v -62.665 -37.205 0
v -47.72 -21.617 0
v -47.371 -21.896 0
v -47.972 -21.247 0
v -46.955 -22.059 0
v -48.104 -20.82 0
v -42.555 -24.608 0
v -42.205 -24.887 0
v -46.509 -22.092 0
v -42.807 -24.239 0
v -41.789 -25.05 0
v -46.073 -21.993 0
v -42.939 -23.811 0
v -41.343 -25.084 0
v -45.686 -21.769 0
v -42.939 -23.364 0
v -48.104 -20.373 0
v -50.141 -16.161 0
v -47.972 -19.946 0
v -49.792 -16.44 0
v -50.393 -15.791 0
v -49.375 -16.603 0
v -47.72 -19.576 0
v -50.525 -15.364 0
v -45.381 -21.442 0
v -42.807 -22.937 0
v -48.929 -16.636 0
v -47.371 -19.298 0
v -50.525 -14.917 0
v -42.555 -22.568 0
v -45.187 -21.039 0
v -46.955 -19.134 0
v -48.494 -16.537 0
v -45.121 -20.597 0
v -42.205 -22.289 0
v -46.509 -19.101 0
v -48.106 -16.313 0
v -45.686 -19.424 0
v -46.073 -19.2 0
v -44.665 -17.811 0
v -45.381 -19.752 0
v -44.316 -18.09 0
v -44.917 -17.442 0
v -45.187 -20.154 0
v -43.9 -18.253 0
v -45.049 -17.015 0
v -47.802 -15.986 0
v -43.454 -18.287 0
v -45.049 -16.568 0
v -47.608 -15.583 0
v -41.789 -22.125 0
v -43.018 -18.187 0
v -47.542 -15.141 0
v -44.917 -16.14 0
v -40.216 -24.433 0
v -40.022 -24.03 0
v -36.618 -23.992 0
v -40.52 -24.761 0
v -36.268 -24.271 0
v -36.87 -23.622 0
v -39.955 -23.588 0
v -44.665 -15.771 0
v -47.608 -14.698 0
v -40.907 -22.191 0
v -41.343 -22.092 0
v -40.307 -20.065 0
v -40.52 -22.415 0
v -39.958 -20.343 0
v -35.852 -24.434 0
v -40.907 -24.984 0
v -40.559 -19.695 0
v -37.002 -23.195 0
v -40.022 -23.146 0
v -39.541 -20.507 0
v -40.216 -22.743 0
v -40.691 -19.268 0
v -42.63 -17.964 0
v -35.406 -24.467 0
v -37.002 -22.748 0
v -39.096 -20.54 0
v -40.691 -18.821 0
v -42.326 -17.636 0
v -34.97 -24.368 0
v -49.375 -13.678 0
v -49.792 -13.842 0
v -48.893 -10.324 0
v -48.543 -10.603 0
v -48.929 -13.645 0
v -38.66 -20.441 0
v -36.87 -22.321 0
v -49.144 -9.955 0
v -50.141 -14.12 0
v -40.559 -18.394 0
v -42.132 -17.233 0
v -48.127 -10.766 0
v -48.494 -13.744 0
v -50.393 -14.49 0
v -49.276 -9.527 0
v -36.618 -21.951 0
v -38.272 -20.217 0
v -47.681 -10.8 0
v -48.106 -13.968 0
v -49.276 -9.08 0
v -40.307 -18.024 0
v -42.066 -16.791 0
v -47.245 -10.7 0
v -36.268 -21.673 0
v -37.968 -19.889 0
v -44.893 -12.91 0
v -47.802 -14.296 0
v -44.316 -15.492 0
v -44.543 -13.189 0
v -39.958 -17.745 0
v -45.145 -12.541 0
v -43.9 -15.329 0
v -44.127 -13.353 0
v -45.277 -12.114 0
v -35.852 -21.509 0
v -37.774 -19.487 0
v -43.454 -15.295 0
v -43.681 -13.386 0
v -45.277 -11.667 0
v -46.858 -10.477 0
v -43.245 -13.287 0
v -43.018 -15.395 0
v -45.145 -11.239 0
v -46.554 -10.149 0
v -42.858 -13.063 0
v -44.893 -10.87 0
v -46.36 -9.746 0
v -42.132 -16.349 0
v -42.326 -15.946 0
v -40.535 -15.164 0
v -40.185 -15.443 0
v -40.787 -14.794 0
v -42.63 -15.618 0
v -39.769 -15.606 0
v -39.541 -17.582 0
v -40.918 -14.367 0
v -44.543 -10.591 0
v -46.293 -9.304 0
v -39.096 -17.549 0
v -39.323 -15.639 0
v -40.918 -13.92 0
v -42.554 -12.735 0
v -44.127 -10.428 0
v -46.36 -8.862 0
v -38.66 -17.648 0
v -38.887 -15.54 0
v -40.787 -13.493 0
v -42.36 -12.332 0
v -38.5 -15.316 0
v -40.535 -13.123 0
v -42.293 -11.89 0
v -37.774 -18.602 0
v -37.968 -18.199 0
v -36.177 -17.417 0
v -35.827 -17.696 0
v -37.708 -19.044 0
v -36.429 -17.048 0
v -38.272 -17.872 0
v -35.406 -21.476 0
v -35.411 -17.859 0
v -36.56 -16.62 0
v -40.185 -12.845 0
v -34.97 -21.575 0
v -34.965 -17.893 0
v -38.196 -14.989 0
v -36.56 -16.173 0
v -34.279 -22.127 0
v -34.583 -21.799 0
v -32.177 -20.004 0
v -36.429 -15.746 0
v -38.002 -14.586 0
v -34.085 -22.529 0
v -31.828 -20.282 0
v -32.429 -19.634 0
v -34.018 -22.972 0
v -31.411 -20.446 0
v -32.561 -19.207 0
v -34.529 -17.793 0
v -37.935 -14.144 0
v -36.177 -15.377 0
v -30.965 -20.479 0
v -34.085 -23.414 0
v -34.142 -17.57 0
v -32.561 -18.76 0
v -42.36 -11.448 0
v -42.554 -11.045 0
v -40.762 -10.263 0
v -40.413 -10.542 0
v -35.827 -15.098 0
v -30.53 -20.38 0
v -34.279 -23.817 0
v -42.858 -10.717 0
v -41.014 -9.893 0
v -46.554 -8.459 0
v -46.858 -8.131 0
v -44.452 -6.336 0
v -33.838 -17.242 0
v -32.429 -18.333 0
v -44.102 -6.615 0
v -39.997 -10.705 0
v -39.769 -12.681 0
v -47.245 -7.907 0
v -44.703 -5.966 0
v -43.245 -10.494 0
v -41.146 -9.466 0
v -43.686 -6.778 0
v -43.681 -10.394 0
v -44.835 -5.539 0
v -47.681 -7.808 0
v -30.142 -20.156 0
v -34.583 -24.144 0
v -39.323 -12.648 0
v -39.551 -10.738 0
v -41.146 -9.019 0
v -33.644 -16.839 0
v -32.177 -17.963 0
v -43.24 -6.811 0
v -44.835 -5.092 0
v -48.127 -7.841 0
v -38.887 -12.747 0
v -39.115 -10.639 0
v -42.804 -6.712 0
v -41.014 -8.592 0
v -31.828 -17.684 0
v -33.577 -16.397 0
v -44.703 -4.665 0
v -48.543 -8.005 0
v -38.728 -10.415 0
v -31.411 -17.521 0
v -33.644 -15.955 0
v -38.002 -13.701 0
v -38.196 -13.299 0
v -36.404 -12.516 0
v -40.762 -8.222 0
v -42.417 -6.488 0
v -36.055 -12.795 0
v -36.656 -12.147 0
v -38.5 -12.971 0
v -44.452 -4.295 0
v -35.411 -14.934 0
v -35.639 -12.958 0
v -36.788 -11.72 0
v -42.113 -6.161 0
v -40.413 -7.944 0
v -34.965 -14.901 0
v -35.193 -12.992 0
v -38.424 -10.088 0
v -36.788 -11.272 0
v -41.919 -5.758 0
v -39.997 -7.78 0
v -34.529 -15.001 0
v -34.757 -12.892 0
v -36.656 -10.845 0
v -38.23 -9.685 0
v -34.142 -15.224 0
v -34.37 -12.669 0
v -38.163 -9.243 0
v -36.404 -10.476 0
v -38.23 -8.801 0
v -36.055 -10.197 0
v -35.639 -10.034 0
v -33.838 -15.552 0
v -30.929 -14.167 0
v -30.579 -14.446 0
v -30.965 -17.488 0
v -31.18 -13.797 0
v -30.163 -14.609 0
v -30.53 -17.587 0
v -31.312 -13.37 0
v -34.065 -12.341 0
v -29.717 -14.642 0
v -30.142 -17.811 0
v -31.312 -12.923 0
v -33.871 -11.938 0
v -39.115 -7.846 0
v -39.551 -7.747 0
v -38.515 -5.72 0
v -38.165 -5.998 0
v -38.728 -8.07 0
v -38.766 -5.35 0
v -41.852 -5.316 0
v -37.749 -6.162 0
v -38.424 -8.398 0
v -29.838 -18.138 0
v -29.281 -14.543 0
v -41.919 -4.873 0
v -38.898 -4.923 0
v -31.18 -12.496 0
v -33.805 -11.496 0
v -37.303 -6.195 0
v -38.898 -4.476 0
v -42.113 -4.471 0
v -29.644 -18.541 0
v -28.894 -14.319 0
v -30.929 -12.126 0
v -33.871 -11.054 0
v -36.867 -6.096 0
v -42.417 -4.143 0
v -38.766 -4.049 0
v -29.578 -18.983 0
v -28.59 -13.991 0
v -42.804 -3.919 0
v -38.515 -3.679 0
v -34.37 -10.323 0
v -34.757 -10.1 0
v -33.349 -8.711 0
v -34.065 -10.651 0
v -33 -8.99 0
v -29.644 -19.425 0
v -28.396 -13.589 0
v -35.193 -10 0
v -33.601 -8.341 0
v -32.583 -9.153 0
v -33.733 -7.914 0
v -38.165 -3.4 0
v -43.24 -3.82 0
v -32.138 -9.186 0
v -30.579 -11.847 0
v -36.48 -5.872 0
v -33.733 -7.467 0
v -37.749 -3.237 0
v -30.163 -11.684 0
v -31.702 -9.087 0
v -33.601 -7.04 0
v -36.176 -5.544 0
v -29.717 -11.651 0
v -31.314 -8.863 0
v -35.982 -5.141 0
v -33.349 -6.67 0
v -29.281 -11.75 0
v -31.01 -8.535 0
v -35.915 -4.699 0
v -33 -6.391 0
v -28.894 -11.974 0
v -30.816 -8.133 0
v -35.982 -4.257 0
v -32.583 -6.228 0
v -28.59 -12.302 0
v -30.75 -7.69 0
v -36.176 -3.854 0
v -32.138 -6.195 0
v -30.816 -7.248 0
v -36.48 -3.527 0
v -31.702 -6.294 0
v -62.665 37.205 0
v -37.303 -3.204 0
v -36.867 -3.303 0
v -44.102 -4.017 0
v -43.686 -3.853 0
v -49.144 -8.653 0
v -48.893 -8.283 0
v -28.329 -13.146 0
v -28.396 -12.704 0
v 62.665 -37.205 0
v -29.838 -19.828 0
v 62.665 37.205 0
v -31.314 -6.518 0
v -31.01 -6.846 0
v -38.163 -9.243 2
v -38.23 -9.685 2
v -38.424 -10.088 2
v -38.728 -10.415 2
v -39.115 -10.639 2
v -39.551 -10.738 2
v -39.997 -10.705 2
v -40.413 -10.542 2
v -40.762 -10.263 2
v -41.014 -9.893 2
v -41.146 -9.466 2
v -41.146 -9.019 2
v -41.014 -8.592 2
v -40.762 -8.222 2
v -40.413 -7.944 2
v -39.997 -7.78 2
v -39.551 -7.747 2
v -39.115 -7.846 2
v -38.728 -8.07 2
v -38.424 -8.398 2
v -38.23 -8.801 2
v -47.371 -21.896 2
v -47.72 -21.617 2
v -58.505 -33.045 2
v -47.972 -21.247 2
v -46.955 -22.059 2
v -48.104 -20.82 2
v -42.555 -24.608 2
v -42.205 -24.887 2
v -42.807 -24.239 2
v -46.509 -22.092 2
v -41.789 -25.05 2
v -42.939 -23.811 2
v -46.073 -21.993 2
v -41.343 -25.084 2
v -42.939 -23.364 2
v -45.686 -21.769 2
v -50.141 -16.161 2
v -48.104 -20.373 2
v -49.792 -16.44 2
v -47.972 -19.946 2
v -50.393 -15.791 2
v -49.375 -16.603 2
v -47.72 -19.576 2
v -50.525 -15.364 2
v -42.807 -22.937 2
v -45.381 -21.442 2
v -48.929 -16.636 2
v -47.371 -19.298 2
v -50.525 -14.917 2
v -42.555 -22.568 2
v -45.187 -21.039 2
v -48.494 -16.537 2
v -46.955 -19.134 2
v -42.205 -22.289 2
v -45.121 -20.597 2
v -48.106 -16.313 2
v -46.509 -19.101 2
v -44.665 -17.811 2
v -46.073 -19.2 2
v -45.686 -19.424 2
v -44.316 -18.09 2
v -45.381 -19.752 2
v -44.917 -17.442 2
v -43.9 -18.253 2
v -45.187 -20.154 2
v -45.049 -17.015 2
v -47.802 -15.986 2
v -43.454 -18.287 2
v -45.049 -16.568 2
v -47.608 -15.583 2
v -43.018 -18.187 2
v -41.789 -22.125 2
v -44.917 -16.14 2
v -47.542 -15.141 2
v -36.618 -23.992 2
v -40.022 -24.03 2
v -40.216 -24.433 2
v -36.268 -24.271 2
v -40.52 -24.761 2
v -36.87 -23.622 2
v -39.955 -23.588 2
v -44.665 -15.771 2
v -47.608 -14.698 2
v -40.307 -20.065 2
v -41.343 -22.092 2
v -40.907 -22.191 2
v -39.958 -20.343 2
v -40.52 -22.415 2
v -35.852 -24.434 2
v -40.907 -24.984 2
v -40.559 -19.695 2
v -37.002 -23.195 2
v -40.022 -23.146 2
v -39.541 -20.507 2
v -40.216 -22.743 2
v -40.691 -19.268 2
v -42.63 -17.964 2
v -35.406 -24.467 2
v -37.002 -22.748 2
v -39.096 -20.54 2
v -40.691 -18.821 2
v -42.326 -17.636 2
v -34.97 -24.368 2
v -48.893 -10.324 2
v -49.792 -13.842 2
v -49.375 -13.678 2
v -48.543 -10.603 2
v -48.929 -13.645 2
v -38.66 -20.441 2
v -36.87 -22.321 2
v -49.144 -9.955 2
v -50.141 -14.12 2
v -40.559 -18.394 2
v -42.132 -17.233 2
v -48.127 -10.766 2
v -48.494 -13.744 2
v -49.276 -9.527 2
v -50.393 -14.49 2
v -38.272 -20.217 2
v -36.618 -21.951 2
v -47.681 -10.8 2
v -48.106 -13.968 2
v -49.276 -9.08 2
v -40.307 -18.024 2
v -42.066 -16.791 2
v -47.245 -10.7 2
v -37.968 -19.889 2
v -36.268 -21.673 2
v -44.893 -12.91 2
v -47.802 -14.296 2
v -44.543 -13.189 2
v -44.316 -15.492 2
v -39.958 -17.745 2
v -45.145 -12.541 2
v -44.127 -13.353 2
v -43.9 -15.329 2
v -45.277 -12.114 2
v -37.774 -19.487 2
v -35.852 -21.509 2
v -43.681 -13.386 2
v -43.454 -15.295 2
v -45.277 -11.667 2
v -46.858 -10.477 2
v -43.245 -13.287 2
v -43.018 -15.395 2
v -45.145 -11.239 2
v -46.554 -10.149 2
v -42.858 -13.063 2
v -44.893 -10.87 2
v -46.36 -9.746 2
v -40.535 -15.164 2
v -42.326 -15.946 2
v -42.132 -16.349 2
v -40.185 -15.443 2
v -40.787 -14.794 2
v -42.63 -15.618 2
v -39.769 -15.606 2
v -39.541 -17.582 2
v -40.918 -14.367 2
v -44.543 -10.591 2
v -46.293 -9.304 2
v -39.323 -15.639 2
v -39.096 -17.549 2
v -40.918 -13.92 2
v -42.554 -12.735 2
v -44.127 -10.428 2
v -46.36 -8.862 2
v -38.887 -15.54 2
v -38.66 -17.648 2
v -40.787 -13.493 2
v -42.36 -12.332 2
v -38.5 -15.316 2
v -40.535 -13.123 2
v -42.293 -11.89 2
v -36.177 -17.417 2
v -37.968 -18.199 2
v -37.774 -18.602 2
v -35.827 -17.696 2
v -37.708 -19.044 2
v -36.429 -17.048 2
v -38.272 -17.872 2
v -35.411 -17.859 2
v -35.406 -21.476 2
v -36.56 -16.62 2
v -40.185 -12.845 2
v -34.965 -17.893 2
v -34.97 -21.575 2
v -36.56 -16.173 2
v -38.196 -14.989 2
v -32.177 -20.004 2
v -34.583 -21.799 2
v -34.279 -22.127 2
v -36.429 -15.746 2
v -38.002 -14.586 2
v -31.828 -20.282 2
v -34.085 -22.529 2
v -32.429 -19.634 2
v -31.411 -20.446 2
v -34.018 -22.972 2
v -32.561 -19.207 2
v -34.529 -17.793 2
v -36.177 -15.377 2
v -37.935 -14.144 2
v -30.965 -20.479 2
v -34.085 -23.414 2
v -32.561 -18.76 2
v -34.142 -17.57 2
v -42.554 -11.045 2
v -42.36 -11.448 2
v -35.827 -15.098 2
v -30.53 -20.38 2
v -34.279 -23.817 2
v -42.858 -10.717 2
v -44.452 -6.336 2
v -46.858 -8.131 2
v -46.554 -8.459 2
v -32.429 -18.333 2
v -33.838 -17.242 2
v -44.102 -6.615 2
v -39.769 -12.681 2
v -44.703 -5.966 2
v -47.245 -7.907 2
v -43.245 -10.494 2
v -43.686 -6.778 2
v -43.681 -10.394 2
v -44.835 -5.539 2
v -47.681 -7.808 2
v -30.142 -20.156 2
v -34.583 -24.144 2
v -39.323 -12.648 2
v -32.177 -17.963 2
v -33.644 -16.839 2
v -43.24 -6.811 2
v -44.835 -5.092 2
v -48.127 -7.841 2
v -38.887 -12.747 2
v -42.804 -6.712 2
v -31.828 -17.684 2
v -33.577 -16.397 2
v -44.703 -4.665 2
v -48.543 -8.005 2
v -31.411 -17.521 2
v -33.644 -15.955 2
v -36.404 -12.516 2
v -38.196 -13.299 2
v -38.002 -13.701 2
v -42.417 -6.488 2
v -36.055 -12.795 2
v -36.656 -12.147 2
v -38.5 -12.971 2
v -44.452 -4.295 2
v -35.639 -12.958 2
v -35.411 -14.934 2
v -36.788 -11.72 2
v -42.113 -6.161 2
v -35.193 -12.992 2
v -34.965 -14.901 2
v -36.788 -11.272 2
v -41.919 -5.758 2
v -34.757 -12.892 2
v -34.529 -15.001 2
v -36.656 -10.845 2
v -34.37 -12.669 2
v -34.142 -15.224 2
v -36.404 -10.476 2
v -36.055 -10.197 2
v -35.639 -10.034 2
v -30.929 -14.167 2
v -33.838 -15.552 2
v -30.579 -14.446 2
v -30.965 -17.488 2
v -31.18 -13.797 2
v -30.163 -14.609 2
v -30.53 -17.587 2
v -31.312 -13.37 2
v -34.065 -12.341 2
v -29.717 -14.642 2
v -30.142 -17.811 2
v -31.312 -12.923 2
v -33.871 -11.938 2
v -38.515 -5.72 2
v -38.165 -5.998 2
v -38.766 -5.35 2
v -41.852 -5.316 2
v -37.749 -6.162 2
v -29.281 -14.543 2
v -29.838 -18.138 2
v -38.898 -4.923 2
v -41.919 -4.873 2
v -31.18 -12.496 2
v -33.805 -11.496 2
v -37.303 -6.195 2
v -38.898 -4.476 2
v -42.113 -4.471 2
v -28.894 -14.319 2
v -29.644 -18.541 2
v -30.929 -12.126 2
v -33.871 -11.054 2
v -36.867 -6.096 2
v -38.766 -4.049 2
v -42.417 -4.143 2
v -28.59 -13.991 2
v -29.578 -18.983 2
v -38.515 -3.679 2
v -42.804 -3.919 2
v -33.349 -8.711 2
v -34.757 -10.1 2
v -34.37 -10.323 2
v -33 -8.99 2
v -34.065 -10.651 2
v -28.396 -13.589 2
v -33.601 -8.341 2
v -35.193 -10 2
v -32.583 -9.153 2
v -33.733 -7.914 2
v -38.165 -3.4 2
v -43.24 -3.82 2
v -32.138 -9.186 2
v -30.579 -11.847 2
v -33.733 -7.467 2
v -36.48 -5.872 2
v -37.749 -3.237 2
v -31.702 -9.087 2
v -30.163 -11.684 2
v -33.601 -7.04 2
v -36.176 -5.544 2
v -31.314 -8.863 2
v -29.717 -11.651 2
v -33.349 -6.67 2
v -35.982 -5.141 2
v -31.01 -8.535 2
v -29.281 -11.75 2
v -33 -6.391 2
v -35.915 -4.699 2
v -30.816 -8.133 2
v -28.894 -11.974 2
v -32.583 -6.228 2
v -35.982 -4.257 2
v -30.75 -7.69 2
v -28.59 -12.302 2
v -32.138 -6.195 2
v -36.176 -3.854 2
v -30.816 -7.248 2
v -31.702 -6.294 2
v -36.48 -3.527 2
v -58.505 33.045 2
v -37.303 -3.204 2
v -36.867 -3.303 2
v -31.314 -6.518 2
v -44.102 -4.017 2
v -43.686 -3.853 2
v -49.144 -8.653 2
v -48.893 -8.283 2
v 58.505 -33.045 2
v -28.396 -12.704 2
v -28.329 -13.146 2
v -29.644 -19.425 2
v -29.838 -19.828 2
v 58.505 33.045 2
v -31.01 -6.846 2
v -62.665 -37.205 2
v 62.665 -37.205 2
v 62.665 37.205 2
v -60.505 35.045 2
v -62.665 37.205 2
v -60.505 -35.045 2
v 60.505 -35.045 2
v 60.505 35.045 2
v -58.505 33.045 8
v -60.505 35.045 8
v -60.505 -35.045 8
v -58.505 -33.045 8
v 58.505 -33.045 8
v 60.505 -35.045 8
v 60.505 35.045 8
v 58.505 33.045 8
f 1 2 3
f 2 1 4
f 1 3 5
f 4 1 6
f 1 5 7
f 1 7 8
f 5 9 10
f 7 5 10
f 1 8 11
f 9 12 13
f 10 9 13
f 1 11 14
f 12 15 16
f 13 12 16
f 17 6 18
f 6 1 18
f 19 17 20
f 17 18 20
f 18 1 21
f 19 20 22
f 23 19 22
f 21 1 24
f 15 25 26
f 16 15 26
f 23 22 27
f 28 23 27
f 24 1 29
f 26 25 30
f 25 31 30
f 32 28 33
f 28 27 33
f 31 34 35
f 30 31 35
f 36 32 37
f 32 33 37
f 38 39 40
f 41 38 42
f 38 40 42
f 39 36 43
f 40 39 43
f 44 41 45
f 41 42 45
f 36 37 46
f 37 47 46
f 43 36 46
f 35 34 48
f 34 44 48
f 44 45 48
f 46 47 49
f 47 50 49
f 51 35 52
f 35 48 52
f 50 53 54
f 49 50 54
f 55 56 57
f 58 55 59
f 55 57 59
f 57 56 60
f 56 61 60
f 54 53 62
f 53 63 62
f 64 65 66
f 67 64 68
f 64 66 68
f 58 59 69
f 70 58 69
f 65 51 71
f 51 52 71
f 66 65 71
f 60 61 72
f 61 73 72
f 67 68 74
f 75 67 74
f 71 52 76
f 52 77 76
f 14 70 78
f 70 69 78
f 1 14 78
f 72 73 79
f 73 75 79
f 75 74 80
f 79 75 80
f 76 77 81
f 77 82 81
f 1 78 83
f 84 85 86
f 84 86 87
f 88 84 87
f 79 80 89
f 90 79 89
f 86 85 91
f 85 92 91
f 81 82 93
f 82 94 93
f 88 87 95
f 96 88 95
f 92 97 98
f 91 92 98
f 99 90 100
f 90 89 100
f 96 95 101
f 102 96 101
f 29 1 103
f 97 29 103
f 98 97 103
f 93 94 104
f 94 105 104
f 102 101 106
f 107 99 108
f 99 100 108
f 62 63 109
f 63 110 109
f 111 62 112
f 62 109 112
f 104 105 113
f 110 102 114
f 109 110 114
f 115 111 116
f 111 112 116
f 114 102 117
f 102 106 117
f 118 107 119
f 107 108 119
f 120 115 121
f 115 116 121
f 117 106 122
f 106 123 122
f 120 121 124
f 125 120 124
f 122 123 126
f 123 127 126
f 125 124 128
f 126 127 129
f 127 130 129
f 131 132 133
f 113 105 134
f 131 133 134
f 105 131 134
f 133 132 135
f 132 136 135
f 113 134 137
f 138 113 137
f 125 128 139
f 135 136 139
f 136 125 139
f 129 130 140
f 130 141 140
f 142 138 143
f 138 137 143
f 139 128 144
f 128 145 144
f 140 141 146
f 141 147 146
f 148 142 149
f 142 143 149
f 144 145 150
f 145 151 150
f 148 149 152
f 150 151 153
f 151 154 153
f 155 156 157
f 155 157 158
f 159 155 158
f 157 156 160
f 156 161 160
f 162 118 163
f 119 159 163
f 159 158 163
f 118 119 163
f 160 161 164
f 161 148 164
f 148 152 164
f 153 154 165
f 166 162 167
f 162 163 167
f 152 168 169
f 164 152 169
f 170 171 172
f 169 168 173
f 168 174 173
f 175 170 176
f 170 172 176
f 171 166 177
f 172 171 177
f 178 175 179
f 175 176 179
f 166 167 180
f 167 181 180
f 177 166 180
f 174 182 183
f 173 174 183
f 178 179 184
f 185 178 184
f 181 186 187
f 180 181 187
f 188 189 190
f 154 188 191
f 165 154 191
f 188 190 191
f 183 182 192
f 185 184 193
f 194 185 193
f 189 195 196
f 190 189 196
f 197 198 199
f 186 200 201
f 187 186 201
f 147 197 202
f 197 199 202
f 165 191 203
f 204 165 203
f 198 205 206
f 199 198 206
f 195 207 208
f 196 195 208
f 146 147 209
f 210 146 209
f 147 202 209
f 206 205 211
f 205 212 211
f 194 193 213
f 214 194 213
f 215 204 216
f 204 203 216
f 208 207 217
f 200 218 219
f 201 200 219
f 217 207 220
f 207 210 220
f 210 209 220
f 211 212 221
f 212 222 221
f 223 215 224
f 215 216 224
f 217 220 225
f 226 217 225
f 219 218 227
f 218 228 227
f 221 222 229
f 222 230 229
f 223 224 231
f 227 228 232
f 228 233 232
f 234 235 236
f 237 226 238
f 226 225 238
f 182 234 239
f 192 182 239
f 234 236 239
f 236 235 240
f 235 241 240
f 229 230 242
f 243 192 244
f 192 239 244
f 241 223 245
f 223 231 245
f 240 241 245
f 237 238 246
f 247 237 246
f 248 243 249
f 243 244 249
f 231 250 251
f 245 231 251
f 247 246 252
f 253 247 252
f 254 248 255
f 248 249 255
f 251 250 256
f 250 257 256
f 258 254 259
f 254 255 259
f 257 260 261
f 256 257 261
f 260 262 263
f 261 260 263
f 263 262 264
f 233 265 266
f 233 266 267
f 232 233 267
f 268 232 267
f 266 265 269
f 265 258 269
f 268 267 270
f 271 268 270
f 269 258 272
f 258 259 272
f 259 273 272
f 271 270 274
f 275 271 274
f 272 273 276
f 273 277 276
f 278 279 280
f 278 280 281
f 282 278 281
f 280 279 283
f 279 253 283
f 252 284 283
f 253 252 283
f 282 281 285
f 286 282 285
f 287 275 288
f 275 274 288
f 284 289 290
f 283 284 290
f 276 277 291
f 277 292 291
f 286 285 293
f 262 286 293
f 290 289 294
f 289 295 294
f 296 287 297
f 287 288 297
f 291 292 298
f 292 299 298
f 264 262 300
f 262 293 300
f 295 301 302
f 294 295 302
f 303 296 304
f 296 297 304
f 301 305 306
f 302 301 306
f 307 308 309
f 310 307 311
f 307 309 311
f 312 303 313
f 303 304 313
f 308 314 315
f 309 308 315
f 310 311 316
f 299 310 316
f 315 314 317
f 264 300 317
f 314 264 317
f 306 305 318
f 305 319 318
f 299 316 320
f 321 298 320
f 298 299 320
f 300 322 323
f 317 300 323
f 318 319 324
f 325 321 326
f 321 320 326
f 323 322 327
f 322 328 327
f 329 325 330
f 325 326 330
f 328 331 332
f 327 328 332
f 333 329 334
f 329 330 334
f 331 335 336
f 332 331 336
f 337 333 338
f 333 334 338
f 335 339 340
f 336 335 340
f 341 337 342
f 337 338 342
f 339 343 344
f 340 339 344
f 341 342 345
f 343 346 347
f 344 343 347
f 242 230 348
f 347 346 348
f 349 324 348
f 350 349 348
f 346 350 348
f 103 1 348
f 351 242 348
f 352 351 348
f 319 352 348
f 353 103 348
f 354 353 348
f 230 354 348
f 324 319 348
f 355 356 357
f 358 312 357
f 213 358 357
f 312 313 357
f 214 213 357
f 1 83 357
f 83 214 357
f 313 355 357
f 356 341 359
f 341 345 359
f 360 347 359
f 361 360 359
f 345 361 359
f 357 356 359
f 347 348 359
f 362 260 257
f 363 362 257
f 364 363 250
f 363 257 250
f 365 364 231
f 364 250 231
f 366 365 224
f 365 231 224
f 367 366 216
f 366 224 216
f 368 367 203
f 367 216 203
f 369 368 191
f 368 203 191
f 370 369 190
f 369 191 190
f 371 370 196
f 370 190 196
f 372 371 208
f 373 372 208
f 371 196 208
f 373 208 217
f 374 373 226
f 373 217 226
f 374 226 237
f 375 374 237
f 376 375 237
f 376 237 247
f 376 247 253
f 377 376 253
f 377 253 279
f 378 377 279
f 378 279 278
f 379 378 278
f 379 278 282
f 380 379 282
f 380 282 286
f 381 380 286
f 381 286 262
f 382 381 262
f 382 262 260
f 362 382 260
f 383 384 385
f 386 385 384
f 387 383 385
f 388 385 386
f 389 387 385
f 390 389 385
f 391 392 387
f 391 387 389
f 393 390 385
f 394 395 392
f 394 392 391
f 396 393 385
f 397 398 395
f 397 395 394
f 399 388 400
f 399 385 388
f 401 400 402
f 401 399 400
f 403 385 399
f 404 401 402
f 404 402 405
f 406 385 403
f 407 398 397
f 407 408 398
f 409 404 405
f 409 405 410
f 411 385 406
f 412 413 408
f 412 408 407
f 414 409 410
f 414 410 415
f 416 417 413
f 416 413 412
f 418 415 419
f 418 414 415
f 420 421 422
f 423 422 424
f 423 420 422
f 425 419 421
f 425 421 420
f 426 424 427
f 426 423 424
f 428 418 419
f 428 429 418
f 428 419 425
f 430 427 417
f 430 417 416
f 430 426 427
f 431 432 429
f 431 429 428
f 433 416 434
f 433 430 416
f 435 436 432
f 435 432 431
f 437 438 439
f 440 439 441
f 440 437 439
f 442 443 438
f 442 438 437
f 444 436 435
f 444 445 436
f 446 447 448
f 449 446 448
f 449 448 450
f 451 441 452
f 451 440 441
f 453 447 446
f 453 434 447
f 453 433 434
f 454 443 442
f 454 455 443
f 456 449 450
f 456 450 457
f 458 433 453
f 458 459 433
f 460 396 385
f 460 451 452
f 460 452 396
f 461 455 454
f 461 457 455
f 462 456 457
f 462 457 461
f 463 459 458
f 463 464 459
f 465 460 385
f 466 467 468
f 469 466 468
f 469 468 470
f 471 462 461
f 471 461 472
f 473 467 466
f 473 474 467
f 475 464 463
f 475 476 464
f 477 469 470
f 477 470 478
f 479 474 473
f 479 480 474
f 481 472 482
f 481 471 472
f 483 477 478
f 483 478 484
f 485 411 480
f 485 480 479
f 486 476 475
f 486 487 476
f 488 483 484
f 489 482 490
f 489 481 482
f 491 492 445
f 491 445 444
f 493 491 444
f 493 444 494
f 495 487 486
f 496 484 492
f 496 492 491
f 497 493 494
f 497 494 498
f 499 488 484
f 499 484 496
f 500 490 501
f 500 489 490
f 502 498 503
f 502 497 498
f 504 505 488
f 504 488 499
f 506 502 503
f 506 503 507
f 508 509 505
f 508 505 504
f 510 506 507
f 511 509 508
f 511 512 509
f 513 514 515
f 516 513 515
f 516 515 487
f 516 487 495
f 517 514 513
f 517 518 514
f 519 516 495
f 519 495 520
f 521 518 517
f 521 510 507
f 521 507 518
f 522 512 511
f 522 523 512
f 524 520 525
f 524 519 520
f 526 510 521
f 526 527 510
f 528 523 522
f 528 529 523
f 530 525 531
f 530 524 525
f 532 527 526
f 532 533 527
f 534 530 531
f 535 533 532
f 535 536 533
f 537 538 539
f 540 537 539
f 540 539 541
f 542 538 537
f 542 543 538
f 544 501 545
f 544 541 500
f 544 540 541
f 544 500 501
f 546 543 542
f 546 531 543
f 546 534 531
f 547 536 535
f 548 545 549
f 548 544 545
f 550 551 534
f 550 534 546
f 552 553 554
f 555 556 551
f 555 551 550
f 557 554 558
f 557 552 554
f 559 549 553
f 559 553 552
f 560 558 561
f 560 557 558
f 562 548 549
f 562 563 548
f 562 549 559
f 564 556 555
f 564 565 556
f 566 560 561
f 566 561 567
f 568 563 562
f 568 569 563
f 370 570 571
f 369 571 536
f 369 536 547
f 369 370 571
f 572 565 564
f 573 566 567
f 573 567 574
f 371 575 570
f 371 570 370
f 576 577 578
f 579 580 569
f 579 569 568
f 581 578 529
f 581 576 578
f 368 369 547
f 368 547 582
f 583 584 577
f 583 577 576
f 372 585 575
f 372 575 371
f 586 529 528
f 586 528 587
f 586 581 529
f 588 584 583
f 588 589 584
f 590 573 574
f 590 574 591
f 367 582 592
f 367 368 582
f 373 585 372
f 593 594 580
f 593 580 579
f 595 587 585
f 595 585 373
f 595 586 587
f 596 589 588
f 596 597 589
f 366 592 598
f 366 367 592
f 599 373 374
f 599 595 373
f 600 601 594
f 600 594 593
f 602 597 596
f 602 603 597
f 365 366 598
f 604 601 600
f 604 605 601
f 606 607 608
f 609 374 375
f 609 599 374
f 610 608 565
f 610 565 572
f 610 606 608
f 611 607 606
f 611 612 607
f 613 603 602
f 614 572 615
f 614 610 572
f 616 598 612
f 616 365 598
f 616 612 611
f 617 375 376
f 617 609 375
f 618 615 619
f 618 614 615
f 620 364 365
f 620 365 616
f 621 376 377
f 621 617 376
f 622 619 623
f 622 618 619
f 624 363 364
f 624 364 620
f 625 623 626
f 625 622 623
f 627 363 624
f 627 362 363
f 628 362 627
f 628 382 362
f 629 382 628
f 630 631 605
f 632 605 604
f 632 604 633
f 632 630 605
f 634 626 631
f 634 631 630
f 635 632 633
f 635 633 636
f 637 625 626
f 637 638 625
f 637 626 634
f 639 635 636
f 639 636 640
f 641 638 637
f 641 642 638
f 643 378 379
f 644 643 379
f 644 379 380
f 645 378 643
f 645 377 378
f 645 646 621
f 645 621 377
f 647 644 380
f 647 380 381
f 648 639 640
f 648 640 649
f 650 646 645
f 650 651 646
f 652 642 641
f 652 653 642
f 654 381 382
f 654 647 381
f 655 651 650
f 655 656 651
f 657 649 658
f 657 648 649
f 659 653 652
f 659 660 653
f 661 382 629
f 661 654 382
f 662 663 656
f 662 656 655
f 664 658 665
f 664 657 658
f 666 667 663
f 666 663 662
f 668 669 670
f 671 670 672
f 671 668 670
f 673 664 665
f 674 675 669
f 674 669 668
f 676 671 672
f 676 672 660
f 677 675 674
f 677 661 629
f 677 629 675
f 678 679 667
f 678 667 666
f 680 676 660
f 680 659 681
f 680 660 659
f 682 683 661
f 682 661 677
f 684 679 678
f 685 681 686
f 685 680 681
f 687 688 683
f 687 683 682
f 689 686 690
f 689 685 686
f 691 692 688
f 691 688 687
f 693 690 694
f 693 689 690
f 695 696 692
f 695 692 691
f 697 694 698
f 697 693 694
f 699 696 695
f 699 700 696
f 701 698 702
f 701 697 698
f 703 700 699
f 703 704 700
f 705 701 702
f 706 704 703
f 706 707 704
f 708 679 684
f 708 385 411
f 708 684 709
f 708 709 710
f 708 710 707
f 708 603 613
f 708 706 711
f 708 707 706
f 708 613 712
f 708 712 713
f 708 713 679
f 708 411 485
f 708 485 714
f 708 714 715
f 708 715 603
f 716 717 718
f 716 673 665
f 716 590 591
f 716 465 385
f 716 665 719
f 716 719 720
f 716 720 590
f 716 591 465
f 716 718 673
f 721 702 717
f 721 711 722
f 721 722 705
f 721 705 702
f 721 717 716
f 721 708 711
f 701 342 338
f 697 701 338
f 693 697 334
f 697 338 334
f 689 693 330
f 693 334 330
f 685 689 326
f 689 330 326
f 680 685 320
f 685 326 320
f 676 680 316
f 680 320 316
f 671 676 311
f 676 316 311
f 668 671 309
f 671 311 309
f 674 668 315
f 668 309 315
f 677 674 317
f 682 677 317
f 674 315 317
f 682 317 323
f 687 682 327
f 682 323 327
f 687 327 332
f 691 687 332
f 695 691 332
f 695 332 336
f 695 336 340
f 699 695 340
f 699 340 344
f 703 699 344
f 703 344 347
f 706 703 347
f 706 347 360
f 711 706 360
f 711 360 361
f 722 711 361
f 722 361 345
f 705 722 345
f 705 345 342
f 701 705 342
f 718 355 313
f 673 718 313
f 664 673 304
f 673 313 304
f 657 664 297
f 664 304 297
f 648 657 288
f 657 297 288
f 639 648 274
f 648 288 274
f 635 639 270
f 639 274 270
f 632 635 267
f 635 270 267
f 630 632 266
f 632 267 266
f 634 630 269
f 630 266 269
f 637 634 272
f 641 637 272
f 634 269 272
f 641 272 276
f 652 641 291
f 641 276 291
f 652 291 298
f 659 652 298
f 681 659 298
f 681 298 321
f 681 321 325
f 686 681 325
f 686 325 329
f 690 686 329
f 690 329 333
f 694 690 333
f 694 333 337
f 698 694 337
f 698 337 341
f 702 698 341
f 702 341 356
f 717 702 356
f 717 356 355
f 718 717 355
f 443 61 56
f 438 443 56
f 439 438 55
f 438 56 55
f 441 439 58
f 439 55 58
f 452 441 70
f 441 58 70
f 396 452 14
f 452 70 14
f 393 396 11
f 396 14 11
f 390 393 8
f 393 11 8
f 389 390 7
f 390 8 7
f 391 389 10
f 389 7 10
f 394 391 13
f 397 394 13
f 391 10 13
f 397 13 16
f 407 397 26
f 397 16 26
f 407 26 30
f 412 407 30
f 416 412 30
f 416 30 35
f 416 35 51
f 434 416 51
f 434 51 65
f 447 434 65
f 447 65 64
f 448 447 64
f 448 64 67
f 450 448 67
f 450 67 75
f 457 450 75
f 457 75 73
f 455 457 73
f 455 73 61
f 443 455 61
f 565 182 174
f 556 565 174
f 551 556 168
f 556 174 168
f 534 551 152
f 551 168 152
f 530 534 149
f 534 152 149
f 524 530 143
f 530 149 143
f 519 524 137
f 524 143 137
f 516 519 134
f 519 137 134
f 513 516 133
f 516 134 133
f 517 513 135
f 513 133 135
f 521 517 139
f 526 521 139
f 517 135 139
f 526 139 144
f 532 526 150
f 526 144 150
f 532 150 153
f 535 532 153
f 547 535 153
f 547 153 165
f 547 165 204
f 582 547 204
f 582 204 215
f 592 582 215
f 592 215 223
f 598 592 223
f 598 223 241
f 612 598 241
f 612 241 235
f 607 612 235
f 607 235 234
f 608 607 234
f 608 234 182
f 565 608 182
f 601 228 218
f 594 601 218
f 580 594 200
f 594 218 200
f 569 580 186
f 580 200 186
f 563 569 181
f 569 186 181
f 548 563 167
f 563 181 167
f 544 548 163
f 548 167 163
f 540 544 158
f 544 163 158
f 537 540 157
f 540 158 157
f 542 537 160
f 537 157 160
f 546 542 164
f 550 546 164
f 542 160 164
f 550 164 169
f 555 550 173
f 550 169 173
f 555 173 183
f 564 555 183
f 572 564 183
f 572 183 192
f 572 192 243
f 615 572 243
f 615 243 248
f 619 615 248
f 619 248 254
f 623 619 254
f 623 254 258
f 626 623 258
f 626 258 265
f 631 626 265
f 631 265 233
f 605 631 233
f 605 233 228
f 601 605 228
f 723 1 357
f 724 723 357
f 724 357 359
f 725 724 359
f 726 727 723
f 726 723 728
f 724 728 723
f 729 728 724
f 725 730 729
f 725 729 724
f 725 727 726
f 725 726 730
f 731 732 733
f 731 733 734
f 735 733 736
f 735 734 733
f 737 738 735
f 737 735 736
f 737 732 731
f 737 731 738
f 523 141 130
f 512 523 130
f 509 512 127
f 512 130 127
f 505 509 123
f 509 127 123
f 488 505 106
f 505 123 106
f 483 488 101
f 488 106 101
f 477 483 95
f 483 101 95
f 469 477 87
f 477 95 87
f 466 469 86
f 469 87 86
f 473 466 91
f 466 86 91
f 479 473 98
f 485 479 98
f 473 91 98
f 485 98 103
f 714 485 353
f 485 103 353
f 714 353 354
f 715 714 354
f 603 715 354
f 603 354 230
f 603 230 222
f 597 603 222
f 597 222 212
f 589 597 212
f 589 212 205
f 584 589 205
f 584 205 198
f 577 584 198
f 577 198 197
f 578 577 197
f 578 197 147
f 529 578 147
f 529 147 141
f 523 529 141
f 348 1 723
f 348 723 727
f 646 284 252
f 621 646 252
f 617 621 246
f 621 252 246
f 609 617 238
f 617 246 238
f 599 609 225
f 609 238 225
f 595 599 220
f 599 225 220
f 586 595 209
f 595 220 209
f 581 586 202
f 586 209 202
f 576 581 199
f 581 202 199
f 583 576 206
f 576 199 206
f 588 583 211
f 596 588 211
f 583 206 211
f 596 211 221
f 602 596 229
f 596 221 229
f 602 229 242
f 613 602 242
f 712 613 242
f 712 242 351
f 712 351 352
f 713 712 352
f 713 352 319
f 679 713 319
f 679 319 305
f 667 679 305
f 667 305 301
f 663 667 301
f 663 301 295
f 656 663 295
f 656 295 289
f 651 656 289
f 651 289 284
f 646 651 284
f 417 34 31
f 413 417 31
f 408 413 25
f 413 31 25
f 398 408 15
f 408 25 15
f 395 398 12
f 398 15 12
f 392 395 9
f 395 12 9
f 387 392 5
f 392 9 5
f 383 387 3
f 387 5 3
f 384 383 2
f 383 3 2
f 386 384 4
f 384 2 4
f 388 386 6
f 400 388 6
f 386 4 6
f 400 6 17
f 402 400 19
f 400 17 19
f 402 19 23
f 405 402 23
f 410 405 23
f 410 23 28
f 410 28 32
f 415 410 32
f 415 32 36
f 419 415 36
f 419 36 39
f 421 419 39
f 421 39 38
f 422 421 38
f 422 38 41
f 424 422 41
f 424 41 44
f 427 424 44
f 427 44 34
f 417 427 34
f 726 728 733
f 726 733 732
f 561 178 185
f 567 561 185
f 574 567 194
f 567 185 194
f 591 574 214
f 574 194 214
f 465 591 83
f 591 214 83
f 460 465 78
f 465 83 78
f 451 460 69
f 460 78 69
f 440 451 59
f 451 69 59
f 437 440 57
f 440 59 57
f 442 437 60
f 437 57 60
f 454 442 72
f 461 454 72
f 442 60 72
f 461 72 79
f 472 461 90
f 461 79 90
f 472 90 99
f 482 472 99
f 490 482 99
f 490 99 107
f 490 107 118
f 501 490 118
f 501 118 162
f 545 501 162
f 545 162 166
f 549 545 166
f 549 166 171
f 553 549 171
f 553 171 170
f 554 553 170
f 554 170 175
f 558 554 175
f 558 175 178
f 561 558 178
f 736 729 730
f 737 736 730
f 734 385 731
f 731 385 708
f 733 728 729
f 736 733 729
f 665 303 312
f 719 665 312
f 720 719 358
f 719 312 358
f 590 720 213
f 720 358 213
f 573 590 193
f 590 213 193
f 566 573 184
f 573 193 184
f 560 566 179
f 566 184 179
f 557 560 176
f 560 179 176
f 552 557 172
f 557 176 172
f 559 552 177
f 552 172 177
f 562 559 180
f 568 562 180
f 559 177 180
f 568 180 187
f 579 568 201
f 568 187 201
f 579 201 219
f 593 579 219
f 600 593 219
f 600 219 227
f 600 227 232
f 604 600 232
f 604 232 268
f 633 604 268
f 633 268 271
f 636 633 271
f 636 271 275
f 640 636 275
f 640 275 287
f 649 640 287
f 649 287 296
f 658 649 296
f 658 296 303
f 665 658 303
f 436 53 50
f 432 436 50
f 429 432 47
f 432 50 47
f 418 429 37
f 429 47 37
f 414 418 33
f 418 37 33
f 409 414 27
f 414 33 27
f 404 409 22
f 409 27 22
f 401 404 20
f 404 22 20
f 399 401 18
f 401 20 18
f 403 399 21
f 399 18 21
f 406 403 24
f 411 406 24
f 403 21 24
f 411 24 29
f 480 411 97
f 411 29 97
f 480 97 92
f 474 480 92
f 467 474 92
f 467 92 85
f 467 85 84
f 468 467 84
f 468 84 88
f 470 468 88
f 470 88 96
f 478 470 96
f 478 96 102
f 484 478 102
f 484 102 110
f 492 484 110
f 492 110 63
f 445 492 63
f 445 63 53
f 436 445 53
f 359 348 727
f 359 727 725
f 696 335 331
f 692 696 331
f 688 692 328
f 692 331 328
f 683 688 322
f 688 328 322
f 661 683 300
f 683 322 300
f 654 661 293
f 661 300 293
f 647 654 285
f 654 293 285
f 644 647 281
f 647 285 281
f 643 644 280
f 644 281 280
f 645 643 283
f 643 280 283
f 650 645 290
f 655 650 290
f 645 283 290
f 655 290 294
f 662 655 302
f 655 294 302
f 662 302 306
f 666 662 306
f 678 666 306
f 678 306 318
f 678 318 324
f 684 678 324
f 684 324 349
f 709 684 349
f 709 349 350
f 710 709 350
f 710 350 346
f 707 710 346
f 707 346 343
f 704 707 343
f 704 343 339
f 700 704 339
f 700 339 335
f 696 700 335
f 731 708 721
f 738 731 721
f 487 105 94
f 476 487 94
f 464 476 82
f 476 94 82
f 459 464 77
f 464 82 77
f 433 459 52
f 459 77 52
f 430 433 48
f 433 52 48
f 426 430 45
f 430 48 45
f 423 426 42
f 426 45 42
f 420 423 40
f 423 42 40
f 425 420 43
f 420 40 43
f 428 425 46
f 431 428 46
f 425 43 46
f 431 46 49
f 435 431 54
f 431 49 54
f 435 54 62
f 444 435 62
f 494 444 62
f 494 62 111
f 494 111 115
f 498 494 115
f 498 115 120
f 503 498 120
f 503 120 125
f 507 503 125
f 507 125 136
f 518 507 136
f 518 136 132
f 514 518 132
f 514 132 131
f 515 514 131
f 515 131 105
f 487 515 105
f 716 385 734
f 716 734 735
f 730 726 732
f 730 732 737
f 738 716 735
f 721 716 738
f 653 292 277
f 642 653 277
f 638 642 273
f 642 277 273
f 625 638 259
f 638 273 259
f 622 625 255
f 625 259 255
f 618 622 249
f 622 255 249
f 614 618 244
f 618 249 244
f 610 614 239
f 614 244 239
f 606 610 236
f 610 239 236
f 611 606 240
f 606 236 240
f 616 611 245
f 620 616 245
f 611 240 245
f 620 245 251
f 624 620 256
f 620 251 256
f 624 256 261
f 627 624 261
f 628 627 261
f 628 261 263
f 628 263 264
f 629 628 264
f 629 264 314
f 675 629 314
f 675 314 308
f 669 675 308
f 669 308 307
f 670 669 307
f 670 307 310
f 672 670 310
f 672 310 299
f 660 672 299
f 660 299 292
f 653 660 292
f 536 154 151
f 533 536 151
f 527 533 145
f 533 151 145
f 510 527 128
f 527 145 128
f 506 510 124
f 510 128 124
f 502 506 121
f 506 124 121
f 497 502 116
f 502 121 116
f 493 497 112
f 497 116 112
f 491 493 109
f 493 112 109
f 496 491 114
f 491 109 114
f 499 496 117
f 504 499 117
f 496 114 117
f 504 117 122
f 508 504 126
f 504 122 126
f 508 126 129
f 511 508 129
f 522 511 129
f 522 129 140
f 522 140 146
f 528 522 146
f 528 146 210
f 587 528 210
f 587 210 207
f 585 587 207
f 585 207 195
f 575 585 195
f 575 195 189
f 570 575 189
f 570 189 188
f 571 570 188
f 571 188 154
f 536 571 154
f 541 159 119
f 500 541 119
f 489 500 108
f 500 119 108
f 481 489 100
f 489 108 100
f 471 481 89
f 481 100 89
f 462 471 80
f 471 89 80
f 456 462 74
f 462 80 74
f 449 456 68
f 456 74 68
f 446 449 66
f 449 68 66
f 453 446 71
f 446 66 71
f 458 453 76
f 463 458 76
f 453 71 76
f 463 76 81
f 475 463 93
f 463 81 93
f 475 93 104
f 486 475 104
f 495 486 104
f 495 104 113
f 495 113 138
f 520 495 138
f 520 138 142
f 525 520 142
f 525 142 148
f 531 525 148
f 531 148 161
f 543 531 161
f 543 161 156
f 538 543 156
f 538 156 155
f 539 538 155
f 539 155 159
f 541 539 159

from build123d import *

# Parameters (mm, degrees)
F0_W     = 125.33
F0_H     = 74.41
F1_DEPTH = 2
F2_W     = 121.01
F2_H     = 70.09
F2_W_2   = 117.01
F2_H_2   = 66.09
F3_DEPTH = 6
F4_R     = 1.5
F5_DEPTH = 8.001


with BuildPart() as f1:
    # F0 (on Top) → F1 (new body)
    with BuildSketch(Plane.XY):
        Rectangle(F0_W, F0_H)
    extrude(amount=F1_DEPTH)

    # F2 (on face) → F3 (join)
    with BuildSketch(Plane.XY.offset(2)):
        Rectangle(F2_W, F2_H)
        Rectangle(F2_W_2, F2_H_2, mode=Mode.SUBTRACT)
    extrude(amount=F3_DEPTH)

    # F4 (on face) → F5 (cut, through all)
    with BuildSketch(Plane(origin=(0, 0, 0), x_dir=(1, 0, 0), z_dir=(0, 0, -1))):
        with Locations((-39.435246, 14.143545)):
            Circle(F4_R)
        with Locations((-35.077156, 16.39686)):
            Circle(F4_R)
        with Locations((-31.077552, 18.983332)):
            Circle(F4_R)
        with Locations((-29.828973, 13.146486)):
            Circle(F4_R)
        with Locations((-32.249665, 7.690482)):
            Circle(F4_R)
        with Locations((-35.304773, 11.495986)):
            Circle(F4_R)
        with Locations((-37.415004, 4.699329)):
            Circle(F4_R)
        with Locations((-43.352007, 5.315545)):
            Circle(F4_R)
        with Locations((-39.662862, 9.242671)):
            Circle(F4_R)
        with Locations((-39.20763, 19.044419)):
            Circle(F4_R)
        with Locations((-35.518485, 22.971545)):
            Circle(F4_R)
        with Locations((-41.455488, 23.587761)):
            Circle(F4_R)
        with Locations((-46.620827, 20.596608)):
            Circle(F4_R)
        with Locations((-43.565719, 16.791103)):
            Circle(F4_R)
        with Locations((-43.793336, 11.890229)):
            Circle(F4_R)
        with Locations((-47.79294, 9.303757)):
            Circle(F4_R)
        with Locations((-49.041518, 15.140604)):
            Circle(F4_R)
    extrude(amount=-F5_DEPTH, mode=Mode.SUBTRACT)


solid = f1.part
